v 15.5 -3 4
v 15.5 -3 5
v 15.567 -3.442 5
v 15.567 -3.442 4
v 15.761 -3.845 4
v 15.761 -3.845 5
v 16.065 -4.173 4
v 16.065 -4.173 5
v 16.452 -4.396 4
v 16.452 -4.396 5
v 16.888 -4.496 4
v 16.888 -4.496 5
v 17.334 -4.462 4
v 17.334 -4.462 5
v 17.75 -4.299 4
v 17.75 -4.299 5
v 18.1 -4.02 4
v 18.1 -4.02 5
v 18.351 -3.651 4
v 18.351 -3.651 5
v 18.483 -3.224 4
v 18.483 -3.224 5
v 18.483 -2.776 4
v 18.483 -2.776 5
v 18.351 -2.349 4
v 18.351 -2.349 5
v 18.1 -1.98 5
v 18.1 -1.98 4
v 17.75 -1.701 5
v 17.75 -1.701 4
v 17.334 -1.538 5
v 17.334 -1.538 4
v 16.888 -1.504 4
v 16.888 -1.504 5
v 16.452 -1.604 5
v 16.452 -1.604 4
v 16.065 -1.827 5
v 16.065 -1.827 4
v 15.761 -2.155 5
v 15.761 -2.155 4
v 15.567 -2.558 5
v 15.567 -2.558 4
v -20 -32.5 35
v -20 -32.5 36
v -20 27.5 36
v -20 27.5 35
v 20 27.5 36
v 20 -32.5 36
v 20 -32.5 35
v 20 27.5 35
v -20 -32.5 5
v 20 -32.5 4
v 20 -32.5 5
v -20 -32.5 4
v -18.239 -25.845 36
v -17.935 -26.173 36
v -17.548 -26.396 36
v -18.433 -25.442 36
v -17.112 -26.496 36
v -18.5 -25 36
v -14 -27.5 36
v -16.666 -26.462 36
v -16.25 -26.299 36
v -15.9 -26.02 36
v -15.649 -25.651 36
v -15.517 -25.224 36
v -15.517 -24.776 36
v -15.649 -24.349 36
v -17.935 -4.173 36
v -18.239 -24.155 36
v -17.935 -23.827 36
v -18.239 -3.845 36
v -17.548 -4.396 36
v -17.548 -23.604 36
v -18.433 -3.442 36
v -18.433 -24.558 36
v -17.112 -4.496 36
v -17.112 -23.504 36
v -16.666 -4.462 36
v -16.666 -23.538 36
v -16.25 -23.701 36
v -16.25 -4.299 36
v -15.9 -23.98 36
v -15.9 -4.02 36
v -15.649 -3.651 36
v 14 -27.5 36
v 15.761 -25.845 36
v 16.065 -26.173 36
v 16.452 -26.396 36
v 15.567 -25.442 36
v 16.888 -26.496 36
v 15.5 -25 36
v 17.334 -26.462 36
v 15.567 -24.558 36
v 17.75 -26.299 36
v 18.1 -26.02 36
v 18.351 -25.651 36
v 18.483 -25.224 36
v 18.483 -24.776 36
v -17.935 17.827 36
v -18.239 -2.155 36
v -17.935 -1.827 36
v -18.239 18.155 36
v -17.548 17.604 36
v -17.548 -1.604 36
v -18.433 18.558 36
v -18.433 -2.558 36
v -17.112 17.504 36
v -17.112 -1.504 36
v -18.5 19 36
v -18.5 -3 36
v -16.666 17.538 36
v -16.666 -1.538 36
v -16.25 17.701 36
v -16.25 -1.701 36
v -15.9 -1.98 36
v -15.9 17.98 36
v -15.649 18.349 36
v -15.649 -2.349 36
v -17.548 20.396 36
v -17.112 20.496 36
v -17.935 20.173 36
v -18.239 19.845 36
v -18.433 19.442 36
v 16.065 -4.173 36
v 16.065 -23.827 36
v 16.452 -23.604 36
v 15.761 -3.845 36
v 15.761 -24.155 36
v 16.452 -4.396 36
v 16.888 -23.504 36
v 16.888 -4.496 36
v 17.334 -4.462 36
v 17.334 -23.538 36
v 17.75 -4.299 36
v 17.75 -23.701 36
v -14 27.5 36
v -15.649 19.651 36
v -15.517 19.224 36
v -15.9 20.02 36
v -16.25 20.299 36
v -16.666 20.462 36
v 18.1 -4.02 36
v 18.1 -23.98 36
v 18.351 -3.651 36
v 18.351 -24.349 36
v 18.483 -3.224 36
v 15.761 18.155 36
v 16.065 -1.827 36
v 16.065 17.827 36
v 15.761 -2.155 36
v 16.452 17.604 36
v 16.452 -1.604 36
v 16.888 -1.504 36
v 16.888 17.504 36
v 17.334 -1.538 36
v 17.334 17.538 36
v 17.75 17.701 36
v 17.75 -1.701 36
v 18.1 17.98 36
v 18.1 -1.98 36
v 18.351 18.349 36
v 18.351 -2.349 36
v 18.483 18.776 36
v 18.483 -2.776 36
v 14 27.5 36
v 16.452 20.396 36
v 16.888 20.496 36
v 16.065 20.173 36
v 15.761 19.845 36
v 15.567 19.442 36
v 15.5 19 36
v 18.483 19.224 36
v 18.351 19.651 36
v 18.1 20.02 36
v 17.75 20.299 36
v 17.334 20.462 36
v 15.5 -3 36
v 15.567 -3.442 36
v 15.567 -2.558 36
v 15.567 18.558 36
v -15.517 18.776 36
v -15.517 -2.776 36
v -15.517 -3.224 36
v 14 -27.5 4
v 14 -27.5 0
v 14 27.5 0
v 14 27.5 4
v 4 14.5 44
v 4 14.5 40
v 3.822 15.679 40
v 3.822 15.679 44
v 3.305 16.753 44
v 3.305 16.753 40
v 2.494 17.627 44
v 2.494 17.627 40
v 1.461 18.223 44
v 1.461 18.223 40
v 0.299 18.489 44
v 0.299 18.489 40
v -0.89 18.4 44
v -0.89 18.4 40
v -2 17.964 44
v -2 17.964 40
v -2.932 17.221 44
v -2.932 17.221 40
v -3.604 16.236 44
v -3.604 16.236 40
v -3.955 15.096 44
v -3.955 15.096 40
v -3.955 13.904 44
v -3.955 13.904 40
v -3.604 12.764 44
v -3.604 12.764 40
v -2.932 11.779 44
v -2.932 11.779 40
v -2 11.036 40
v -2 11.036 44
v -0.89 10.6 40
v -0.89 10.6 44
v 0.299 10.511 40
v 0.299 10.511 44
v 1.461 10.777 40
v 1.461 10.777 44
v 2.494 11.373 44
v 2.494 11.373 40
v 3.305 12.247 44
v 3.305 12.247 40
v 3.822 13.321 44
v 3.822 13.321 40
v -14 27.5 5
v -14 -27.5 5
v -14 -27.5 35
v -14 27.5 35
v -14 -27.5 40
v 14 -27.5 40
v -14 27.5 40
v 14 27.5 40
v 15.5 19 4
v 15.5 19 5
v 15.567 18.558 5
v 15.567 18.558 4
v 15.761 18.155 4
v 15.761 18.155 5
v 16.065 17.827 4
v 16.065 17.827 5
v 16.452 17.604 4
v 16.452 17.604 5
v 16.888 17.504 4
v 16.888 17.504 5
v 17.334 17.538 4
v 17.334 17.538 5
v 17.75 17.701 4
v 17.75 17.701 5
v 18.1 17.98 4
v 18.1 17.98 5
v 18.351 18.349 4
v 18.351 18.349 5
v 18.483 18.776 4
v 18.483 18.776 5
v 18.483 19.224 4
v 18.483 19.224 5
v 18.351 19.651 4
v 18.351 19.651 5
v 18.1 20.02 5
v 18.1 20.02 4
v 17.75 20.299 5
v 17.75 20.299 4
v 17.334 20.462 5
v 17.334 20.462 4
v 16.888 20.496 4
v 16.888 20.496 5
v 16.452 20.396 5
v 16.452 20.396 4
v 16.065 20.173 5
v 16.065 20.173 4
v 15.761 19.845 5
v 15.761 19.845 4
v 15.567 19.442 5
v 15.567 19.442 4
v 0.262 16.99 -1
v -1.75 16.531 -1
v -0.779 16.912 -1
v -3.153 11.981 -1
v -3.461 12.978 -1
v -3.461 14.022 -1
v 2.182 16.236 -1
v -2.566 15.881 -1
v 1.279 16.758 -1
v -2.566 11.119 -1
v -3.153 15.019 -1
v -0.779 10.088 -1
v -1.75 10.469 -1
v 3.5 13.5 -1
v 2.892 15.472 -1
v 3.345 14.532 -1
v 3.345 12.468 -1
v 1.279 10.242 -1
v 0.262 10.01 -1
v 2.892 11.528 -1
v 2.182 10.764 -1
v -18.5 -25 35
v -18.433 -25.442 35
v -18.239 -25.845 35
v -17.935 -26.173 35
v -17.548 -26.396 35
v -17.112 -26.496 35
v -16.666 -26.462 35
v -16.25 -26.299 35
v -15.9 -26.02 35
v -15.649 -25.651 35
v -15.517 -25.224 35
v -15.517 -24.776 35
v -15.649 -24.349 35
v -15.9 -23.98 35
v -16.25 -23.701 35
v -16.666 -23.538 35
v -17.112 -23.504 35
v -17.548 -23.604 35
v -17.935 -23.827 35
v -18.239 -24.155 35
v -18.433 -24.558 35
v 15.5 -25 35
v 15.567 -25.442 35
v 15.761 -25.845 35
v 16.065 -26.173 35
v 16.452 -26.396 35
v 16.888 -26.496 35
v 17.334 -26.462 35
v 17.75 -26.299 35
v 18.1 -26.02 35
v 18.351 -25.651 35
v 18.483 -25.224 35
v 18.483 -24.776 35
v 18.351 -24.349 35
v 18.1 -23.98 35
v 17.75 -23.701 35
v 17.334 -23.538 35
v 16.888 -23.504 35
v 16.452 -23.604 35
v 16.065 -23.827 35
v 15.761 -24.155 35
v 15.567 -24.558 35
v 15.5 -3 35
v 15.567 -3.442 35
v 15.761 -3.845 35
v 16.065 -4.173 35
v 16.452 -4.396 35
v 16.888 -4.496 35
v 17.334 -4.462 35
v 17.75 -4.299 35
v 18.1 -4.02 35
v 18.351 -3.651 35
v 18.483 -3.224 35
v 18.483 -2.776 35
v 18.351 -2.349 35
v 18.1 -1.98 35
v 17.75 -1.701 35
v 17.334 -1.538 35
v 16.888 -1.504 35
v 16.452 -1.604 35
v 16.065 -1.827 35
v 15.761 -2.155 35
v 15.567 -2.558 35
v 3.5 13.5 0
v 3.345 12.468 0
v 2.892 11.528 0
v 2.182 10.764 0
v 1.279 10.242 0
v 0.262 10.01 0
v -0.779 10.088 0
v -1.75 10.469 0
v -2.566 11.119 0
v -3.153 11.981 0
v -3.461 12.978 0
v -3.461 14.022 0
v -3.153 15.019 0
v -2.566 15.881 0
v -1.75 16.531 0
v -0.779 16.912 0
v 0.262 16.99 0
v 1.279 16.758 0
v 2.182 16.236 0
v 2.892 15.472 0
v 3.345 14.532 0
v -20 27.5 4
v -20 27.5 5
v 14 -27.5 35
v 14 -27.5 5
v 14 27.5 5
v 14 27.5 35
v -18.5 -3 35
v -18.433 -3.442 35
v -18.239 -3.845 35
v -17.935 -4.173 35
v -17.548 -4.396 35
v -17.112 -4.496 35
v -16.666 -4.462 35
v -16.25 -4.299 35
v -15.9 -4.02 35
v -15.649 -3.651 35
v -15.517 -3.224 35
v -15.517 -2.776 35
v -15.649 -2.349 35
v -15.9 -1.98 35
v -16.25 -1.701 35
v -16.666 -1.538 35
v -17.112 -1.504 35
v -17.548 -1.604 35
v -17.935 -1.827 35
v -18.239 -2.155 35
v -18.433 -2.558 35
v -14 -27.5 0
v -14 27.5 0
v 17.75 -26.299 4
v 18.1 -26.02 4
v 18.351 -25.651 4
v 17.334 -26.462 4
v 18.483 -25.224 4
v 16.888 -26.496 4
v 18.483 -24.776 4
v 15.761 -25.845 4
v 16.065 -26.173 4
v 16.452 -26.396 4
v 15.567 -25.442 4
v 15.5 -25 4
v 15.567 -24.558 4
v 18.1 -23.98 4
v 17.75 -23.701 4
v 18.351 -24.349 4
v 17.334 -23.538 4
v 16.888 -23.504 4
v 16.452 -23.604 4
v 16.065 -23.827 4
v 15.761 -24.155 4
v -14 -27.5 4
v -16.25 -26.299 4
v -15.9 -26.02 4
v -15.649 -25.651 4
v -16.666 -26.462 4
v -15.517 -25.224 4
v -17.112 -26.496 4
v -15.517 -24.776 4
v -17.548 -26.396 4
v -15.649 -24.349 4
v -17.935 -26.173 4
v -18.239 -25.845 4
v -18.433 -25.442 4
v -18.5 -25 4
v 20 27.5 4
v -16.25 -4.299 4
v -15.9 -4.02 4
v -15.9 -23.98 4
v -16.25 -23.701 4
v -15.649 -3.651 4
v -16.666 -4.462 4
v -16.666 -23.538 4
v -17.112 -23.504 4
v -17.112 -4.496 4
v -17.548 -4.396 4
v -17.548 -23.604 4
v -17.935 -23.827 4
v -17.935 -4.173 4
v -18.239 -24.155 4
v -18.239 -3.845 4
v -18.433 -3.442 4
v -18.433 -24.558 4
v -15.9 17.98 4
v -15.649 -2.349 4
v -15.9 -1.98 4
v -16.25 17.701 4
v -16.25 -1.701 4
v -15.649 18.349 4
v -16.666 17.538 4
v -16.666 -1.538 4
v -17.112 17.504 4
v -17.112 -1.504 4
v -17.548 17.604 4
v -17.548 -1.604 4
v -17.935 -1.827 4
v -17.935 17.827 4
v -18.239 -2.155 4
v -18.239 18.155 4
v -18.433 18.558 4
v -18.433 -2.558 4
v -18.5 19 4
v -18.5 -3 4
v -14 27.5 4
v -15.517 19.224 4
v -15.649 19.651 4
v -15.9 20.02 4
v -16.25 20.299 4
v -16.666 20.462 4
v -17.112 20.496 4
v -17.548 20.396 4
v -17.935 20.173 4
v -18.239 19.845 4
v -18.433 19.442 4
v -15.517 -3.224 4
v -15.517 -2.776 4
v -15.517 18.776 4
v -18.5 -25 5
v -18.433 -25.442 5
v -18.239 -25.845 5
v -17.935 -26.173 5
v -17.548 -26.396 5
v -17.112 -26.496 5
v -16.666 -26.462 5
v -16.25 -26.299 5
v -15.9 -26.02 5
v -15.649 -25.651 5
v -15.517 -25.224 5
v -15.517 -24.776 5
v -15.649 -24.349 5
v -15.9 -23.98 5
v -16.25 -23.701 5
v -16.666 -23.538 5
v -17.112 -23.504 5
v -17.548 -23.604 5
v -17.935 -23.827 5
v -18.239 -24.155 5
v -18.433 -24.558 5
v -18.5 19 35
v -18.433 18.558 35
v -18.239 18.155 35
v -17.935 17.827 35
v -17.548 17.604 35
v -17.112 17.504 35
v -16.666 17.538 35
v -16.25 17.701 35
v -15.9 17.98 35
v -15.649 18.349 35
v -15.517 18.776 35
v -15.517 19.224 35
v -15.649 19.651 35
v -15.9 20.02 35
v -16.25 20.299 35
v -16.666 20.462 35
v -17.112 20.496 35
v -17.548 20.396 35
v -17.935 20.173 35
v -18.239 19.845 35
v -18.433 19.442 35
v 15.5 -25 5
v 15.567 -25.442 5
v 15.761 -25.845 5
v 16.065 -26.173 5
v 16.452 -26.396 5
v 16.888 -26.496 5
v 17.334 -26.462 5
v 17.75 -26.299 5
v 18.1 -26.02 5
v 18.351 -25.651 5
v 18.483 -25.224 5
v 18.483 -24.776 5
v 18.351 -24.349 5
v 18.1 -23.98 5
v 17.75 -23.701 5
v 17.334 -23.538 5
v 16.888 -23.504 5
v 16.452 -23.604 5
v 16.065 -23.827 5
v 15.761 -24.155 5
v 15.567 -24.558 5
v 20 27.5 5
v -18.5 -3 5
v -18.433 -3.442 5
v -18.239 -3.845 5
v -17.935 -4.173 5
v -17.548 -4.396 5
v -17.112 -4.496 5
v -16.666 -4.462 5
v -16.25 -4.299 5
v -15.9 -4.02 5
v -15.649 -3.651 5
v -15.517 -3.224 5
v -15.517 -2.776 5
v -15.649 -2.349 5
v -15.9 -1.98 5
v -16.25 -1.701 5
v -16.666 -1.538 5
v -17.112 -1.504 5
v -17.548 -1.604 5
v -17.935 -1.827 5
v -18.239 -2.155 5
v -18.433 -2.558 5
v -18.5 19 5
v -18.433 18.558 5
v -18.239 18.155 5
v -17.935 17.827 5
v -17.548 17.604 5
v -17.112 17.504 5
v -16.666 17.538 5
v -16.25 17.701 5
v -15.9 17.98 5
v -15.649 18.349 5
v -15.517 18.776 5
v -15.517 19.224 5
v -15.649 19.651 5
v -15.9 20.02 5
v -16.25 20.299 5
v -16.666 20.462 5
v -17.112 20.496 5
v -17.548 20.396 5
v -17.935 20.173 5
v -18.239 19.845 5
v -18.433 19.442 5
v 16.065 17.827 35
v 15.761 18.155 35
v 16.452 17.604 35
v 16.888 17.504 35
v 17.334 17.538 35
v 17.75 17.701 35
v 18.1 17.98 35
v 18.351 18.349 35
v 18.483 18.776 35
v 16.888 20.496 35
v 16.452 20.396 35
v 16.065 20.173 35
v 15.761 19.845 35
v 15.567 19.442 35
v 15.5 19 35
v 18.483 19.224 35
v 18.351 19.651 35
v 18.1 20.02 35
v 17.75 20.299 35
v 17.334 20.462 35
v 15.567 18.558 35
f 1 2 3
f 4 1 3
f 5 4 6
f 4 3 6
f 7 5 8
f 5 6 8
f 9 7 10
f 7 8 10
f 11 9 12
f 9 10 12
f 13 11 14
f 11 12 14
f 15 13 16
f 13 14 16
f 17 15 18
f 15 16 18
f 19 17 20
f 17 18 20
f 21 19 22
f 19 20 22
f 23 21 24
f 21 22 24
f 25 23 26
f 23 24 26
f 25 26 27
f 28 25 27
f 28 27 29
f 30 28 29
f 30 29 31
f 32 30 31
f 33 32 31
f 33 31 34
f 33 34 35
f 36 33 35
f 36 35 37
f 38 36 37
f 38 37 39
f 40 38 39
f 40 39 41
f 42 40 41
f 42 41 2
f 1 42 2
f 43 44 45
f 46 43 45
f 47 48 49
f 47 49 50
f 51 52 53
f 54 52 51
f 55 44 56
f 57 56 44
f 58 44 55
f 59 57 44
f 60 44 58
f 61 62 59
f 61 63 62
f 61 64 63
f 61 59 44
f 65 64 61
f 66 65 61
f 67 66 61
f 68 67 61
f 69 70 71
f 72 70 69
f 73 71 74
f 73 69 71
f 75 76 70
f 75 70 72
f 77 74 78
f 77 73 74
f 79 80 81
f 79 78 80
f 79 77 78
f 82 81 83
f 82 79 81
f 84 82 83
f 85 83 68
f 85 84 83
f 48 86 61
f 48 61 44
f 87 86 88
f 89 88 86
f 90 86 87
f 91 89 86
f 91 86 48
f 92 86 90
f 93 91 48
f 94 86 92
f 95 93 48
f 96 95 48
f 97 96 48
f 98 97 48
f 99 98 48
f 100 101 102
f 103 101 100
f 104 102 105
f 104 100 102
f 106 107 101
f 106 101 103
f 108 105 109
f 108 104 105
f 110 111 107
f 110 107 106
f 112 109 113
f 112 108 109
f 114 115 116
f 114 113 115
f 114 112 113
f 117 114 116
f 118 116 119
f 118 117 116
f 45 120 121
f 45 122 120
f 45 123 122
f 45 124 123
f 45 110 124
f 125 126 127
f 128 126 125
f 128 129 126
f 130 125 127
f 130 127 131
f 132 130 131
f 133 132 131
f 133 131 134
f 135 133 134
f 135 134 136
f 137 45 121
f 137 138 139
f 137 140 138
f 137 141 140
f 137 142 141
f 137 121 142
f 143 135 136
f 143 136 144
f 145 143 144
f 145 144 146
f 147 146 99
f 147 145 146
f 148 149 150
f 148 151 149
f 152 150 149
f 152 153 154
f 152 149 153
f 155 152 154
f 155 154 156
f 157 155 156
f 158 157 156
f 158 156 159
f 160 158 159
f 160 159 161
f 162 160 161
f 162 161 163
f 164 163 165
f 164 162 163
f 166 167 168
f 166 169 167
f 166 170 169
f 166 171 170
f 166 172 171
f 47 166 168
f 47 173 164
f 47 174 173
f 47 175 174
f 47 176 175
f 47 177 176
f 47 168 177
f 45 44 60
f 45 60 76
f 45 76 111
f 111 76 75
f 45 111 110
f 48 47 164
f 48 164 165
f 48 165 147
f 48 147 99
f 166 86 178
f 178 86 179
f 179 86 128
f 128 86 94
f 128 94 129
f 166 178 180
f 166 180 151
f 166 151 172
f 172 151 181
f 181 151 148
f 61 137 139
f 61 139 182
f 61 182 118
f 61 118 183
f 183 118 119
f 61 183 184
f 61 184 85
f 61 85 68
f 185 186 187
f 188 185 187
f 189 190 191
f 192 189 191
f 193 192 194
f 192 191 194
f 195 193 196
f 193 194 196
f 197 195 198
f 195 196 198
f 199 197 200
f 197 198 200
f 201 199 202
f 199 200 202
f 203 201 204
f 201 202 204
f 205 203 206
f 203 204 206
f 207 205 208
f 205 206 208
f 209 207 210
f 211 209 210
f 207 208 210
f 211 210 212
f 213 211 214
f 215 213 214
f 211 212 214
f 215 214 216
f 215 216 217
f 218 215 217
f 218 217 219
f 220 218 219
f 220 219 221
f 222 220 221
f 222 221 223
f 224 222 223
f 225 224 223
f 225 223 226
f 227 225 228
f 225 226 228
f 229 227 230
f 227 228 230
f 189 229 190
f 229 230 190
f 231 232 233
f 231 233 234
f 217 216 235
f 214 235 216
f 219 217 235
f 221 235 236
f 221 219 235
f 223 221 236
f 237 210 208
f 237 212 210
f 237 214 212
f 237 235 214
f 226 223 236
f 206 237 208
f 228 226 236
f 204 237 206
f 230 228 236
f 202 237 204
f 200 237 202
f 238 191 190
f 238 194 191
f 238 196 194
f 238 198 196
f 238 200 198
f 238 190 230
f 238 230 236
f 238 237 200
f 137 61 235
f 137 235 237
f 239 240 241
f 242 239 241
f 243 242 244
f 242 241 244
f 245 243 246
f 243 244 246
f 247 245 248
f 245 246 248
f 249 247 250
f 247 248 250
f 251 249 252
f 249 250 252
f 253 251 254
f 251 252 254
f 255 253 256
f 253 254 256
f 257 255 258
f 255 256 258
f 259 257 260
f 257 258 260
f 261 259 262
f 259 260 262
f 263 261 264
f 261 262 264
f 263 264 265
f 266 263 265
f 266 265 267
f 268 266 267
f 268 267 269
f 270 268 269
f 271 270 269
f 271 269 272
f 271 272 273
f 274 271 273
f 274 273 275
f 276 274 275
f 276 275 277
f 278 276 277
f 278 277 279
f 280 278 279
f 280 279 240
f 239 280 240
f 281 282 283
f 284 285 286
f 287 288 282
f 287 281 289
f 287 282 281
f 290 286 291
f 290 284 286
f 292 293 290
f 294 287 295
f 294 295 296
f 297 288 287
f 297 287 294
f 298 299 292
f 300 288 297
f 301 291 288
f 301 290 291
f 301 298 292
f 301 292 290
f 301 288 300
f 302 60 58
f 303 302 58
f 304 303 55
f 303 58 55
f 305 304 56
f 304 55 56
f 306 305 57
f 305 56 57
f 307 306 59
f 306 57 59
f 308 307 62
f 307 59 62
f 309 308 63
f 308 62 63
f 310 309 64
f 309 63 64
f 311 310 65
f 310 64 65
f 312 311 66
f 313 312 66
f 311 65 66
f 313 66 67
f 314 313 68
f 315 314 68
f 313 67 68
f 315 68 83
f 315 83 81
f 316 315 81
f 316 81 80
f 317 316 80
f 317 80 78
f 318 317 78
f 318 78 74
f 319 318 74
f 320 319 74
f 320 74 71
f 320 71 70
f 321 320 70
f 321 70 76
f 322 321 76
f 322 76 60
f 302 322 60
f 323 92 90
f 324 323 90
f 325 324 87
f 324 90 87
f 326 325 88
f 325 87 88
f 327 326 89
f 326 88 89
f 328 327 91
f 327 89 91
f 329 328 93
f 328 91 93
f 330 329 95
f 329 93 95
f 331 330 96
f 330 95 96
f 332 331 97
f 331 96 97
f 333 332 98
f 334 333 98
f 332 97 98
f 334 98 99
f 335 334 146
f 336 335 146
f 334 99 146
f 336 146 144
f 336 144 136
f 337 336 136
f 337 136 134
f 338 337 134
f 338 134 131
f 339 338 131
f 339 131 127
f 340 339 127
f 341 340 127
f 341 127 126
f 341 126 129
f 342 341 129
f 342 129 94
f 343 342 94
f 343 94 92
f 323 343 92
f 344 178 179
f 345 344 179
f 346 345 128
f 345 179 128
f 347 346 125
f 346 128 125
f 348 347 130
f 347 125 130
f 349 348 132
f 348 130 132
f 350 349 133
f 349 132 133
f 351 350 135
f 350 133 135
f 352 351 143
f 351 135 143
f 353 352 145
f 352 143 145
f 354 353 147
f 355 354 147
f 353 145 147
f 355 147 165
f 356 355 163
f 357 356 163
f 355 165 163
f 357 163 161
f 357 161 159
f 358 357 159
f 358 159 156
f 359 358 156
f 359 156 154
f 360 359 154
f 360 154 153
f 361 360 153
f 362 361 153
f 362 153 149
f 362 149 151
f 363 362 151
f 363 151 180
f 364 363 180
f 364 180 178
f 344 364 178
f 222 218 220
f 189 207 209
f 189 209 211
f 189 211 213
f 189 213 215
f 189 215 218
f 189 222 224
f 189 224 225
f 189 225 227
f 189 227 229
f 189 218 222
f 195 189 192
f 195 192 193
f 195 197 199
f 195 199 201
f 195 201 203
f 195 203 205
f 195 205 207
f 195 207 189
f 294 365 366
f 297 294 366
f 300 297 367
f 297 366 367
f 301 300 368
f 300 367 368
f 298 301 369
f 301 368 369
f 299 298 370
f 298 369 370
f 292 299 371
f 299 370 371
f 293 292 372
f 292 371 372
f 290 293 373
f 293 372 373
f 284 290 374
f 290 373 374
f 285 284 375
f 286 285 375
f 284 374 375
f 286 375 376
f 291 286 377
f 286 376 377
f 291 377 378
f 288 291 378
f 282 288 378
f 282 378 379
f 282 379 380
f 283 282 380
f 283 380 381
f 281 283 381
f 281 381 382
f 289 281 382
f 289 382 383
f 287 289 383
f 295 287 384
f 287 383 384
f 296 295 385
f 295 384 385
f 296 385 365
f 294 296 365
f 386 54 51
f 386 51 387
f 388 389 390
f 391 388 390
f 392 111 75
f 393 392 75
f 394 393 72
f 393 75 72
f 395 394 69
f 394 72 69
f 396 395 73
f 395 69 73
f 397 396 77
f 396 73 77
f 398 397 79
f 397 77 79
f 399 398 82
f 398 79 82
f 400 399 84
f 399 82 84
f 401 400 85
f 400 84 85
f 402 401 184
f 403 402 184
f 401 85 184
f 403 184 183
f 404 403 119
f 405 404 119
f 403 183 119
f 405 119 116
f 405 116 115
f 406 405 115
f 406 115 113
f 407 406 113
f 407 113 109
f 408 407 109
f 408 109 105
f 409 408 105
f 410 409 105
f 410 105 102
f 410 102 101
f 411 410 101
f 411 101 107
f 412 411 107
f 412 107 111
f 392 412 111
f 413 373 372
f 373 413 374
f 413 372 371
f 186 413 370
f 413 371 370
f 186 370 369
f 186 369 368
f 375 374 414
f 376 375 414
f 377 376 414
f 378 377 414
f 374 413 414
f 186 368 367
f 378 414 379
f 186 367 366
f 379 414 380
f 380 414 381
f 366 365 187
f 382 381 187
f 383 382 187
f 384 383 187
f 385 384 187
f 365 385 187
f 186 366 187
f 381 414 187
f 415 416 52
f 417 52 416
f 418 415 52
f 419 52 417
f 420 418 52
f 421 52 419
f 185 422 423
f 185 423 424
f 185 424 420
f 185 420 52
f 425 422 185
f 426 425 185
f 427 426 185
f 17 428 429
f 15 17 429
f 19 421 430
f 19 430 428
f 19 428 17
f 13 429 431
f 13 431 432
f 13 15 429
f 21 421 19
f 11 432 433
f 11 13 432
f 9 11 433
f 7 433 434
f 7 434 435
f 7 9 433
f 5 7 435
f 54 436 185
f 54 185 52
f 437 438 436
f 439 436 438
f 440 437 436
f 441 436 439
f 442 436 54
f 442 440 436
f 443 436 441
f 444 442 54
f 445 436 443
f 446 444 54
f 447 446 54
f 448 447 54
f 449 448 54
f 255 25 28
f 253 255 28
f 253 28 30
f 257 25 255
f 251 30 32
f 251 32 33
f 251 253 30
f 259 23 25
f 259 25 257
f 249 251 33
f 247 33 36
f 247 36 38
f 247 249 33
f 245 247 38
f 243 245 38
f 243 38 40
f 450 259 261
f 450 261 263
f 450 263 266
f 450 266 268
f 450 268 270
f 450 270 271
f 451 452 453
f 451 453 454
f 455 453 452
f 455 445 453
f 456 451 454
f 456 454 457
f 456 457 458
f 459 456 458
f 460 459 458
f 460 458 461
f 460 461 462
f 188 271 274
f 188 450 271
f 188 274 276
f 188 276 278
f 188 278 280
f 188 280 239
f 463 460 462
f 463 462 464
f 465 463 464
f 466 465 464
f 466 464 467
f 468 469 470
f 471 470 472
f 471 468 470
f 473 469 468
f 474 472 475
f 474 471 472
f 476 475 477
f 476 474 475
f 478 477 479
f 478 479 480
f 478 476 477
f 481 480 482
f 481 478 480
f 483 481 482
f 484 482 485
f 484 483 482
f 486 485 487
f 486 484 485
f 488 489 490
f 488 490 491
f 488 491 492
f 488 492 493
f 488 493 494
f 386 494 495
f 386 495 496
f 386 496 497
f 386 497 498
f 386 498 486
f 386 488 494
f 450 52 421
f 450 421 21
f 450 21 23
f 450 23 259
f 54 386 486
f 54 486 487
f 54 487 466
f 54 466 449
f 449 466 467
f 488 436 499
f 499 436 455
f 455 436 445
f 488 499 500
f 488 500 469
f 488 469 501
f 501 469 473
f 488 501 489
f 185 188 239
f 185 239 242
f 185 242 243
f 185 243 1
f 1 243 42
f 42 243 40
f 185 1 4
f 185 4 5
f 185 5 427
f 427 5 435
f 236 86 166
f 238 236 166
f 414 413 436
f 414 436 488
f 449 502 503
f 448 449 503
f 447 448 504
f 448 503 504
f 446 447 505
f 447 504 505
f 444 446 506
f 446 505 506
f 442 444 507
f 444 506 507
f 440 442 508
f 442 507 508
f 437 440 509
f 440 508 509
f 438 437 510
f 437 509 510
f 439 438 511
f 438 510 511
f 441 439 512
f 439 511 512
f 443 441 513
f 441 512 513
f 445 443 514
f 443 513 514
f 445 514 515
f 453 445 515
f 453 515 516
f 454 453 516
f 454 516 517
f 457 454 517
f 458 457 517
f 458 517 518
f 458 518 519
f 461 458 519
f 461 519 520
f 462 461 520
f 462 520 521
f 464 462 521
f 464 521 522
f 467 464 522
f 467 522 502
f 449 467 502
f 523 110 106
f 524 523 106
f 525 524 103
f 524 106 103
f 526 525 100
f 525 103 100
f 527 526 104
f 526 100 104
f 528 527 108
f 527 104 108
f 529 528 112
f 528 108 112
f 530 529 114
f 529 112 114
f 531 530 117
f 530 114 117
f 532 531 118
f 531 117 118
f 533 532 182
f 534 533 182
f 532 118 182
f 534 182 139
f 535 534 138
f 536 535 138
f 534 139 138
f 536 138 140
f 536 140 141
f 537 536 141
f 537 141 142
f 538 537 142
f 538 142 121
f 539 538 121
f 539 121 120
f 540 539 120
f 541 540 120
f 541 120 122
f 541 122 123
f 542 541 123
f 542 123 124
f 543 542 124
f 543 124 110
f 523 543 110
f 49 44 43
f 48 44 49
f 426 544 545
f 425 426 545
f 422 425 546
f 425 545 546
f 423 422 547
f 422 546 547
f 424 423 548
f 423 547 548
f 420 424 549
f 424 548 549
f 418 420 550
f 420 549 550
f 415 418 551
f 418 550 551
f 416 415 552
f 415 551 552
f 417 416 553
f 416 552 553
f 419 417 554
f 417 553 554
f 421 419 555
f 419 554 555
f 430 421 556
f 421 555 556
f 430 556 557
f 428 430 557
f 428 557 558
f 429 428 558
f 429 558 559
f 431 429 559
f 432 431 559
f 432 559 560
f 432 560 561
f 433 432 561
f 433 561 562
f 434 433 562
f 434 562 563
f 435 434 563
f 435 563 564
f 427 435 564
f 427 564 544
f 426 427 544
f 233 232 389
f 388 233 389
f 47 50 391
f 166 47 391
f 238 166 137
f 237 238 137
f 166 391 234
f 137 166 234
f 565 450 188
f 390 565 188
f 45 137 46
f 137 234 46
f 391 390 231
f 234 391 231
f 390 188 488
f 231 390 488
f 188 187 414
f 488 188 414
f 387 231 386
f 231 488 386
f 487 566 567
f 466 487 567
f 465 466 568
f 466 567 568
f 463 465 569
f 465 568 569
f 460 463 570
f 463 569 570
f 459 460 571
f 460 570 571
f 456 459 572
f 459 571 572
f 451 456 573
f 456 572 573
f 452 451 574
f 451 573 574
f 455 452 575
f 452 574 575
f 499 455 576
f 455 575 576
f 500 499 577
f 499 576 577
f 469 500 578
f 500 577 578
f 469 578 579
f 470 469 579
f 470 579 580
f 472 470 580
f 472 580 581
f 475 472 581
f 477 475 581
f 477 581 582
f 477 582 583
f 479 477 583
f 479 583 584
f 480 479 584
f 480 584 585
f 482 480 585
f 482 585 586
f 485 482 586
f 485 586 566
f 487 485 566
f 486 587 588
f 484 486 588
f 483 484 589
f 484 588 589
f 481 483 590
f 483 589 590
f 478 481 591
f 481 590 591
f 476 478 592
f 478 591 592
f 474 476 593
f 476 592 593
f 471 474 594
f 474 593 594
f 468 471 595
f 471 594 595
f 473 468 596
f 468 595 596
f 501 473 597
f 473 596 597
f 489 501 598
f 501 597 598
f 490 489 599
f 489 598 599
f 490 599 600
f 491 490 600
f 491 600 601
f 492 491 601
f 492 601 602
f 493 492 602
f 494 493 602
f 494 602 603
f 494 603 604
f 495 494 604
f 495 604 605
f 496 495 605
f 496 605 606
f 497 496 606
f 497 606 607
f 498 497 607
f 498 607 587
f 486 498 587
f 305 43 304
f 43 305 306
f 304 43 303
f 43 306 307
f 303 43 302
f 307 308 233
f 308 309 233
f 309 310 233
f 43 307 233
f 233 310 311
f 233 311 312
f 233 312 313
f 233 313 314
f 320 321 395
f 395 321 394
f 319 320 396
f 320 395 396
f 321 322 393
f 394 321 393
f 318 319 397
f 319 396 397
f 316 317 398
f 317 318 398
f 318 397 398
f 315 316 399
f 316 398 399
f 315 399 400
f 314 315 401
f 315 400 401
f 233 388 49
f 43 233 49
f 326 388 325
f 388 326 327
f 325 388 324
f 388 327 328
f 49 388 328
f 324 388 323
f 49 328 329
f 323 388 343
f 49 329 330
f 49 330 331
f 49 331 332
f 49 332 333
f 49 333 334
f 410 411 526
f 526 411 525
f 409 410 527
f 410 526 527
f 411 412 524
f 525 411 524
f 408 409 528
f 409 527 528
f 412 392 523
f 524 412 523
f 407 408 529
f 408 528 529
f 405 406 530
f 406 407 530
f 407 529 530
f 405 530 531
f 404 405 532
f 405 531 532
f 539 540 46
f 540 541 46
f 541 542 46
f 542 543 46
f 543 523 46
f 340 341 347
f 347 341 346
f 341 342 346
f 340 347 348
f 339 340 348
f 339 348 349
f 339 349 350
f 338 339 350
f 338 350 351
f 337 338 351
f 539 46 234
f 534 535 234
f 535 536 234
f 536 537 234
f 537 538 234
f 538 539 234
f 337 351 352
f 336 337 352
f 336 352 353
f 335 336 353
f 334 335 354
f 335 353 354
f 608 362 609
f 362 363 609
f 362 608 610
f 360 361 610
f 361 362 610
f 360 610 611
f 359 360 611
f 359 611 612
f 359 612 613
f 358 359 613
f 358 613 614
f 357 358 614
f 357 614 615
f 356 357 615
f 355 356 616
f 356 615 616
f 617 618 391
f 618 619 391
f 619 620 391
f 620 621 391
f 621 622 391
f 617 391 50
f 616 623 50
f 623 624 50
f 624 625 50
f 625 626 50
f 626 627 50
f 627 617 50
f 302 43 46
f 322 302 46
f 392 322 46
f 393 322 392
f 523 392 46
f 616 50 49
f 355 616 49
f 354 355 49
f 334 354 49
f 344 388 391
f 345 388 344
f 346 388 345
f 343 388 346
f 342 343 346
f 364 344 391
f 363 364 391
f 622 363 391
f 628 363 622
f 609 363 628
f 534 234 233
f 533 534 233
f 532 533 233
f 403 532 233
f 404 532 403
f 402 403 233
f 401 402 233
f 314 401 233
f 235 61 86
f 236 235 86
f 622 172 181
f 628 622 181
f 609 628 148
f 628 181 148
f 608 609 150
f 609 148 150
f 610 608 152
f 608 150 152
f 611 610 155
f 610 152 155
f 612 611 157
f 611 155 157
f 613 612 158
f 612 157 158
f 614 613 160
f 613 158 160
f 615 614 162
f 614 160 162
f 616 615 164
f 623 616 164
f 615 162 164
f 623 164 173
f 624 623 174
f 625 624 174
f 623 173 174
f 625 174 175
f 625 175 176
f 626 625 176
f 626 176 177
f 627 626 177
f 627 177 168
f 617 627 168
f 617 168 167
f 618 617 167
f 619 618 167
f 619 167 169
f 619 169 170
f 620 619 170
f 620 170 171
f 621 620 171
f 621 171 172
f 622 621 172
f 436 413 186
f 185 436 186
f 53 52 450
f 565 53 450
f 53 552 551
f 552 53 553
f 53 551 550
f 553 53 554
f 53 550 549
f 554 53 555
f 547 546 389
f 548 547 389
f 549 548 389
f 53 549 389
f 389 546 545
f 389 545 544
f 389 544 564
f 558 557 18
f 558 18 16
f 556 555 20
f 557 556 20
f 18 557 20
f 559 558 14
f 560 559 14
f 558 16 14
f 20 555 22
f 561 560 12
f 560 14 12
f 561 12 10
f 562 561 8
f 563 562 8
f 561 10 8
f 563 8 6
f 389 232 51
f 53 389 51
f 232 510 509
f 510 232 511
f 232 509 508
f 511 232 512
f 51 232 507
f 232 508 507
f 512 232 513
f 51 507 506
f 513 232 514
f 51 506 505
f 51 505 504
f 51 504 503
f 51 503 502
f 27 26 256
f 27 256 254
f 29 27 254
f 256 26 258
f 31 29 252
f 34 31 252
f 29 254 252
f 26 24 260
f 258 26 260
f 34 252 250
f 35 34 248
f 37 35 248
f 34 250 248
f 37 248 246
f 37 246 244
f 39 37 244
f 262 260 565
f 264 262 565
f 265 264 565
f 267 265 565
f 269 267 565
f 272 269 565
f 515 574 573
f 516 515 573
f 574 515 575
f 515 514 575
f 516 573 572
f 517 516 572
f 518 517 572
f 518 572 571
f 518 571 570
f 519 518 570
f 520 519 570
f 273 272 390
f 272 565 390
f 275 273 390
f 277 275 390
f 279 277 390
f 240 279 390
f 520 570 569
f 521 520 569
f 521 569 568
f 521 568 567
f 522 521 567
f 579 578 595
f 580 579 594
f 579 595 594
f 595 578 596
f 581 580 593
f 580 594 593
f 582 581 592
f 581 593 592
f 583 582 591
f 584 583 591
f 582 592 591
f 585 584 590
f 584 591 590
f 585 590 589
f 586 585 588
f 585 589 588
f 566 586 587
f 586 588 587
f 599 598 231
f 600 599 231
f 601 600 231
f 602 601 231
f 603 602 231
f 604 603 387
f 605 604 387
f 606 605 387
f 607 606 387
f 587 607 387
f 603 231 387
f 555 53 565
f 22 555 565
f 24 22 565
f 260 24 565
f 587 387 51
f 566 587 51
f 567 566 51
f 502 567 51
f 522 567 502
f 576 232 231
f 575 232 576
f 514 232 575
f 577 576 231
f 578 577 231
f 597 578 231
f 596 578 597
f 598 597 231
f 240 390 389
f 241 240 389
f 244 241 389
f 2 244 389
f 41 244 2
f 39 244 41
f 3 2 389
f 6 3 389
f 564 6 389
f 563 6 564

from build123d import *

# Parameters (mm, degrees)
SKETCH1_W           = 28
SKETCH1_H           = 55
BOSS_EXTRUDE1_DEPTH = 40
SKETCH3_W           = 40
SKETCH3_H           = 60
BOSS_EXTRUDE2_DEPTH = 1
SKETCH4_W           = 40
SKETCH4_H           = 60
BOSS_EXTRUDE3_DEPTH = 1
SKETCH5_R           = 1.5
CUT_EXTRUDE1_DEPTH  = 53.46189093
SKETCH6_R           = 4
BOSS_EXTRUDE4_DEPTH = 4
SKETCH7_R           = 3.5
BOSS_EXTRUDE5_DEPTH = 1


with BuildPart() as part:
    # Sketch1 → Boss-Extrude1 (new body)
    with BuildSketch(Plane.XY):
        with Locations((-6e-08, 0)):
            Rectangle(SKETCH1_W, SKETCH1_H)
    extrude(amount=BOSS_EXTRUDE1_DEPTH)

    # Sketch3 → Boss-Extrude2 (add)
    with BuildSketch(Plane.XY.offset(36)):
        with Locations((0, -2.5)):
            Rectangle(SKETCH3_W, SKETCH3_H)
    extrude(amount=-BOSS_EXTRUDE2_DEPTH)

    # Sketch4 → Boss-Extrude3 (add)
    with BuildSketch(Plane(origin=(0, 0, 4), x_dir=(-1, 0, 0), z_dir=(0, 0, -1))):
        with Locations((0, -2.5)):
            Rectangle(SKETCH4_W, SKETCH4_H)
    extrude(amount=-BOSS_EXTRUDE3_DEPTH)

    # Sketch5 → Cut-Extrude1 (cut, through all)
    with BuildSketch(Plane.XY.offset(36)):
        with Locations(Location((-17, 19, 0), (0, 0, 180))):
            Circle(SKETCH5_R)
        with Locations(Location((17, 18.999999934, 0), (0, 0, 180))):
            Circle(SKETCH5_R)
        with Locations(Location((-17, -3, 0), (0, 0, 180))):
            Circle(SKETCH5_R)
        with Locations(Location((17, -3.000000066, 0), (0, 0, 180))):
            Circle(SKETCH5_R)
        with Locations(Location((17, -25.000000066, 0), (0, 0, 180))):
            Circle(SKETCH5_R)
        with Locations(Location((-17, -25, 0), (0, 0, 180))):
            Circle(SKETCH5_R)
    extrude(amount=-CUT_EXTRUDE1_DEPTH, mode=Mode.SUBTRACT)

    # Sketch6 → Boss-Extrude4 (add)
    with BuildSketch(Plane.XY.offset(40)):
        with Locations((0, 14.5)):
            Circle(SKETCH6_R)
    extrude(amount=BOSS_EXTRUDE4_DEPTH)

    # Sketch7 → Boss-Extrude5 (add)
    with BuildSketch(Plane(origin=(0, 0, 0), x_dir=(-1, 0, 0), z_dir=(0, 0, -1))):
        with Locations(Location((0, 13.5, 0), (0, 0, 180))):
            Circle(SKETCH7_R)
    extrude(amount=BOSS_EXTRUDE5_DEPTH)


solid = part.part
